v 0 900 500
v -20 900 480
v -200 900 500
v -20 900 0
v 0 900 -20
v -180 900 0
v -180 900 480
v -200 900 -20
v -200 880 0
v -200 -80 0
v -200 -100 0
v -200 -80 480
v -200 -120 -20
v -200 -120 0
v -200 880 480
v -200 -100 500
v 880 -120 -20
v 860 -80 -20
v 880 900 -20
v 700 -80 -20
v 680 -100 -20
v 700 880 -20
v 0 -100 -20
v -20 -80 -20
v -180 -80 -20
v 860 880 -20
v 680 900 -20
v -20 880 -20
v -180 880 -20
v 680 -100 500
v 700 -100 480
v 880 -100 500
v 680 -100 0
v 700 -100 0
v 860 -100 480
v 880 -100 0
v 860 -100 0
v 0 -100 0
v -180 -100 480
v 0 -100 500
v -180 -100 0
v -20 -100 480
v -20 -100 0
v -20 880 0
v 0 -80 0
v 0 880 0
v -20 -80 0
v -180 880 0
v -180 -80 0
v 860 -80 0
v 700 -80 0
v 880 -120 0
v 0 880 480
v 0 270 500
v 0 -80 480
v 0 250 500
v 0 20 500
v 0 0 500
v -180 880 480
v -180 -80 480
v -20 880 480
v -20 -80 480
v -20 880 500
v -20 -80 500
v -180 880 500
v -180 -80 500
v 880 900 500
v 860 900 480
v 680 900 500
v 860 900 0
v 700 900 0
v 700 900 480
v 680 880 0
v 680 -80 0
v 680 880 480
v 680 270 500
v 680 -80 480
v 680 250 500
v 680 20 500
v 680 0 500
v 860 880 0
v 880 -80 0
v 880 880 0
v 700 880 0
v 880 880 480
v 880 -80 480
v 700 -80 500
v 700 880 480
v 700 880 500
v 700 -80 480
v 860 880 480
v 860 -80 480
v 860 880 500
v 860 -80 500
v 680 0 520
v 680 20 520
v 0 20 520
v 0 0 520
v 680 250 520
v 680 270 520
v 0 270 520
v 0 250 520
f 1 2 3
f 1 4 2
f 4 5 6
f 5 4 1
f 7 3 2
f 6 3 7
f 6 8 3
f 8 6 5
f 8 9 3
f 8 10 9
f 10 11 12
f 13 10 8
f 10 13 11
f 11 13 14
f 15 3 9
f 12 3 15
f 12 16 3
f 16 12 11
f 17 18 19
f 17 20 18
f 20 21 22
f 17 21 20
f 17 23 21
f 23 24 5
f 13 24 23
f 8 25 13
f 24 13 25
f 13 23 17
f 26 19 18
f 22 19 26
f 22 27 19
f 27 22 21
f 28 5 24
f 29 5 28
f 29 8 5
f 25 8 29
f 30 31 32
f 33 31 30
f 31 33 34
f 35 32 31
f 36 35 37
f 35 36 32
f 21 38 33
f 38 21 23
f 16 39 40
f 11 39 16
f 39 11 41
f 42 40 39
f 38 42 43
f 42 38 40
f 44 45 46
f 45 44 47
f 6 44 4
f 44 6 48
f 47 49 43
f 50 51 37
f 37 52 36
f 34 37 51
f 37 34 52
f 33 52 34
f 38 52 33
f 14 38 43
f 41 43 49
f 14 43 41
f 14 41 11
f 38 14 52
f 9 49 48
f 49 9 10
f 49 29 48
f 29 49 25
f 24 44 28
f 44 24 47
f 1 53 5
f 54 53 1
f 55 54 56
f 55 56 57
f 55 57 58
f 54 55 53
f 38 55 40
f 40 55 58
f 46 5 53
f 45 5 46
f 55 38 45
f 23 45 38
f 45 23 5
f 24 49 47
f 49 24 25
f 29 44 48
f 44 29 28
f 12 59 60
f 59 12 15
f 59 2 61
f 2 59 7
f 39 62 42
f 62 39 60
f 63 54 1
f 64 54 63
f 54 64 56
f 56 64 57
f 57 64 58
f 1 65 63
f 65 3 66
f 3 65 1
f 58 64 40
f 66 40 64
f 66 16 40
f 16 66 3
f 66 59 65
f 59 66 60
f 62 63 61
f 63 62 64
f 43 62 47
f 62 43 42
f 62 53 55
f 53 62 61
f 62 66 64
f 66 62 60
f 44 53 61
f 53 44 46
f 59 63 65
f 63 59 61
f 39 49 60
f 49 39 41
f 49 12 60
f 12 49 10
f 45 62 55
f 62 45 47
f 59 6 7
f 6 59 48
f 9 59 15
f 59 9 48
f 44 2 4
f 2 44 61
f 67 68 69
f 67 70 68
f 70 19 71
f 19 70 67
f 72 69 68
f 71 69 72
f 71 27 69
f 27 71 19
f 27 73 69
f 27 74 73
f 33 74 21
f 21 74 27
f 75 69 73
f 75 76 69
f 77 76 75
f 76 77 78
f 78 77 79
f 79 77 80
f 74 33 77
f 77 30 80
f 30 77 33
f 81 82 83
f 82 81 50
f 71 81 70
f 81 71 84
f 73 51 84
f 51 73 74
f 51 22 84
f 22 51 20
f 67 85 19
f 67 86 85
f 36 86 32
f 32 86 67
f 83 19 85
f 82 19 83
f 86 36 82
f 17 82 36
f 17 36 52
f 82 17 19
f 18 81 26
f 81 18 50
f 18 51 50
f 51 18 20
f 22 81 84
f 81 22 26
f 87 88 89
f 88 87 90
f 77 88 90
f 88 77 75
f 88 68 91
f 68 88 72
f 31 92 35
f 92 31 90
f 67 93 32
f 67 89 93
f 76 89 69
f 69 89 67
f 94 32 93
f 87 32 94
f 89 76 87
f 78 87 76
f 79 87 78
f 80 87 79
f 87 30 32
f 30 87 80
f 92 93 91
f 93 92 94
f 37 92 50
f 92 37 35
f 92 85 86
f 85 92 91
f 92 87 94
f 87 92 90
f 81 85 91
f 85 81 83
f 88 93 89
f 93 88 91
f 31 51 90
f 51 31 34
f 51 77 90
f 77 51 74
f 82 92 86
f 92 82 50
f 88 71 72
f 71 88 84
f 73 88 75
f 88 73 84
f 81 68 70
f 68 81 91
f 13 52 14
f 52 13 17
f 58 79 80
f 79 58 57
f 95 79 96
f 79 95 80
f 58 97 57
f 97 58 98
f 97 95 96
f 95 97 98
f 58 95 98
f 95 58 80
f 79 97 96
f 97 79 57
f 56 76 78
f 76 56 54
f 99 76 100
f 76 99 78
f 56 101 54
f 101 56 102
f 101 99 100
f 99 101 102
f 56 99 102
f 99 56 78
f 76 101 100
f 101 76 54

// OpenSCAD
// -*- mode: c -*-
/* All distances are in mm. */

// Set output quality
$fn=50;

// -- - -- - -- - -- - -- - -- - -- - -- - -- - -- - -- - -- - -- - -- - -- - -- - -- - -- - -- - 
//                                      START SPEC
// -- - -- - -- - -- - -- - -- - -- - -- - -- - -- - -- - -- - -- - -- - -- - -- - -- - -- - -- - 

module render_frame(x, y, length, position, orientation){
    translate(position) {
        rotate(orientation){
            cube([x, y, length]);
        }
    }
}

module render_2020(length, position, orientation){
    render_frame(20, 20, length, position, orientation);
}

module render_4040(length, position, orientation){
    render_frame(40, 40, length, position, orientation);
}

module render_4080(length, position, orientation){
    render_frame(40, 80, length, position, orientation);
}


// -- - -- - -- - -- - -- - -- - -- - -- - -- - -- - -- - -- - -- - -- - -- - -- - -- - -- - -- - 
//                                       END PART SPEC
// -- - -- - -- - -- - -- - -- - -- - -- - -- - -- - -- - -- - -- - -- - -- - -- - -- - -- - -- - 

side_panel_width=200;
side_panel_length=1000;
side_panel_height=500;

// 6m PER BOX (4x each dimension)
module render_side_panel(position){
    translate(position){
        render_2020(side_panel_length, [0,0,0], [-90,0,0]);
        render_2020(side_panel_length, [(side_panel_width - 20),0,0], [-90,0,0]);
        render_2020(side_panel_width, [0,20,0], [-90,0,-90]);
        render_2020(side_panel_width, [0,side_panel_length,0], [-90,0,-90]);
        
        render_2020(side_panel_length, [0,0,side_panel_height], [-90,0,0]);
        render_2020(side_panel_length, [(side_panel_width - 20),0,side_panel_height], [-90,0,0]);
        render_2020(side_panel_width, [0,20,side_panel_height], [-90,0,-90]);
        render_2020(side_panel_width, [0,side_panel_length,side_panel_height], [-90,0,-90]);
        
        render_2020(side_panel_height, [0,0,0],[0,0,0]);
        render_2020(side_panel_height, [(side_panel_width - 20),0,0],[0,0,0]);
        render_2020(side_panel_height, [0,side_panel_length-20,0],[0,0,0]);
        render_2020(side_panel_height, [(side_panel_width - 20),side_panel_length-20,0],[0,0,0]);
        
        
        
    }
}

// Define primary dimensions
frame_width=600;
frame_length=1300;
frame_seat_length=500;
monitor_height=800;


// Bottom rectangnle frame
// 4080: 2x Length, 3x width
if(0){
render_4080(frame_length, [0,0,80], [-90,0,0]);
render_4080(frame_length, [(40+frame_width),0,80], [-90,0,0]);
render_4080(frame_width, [40,40,80], [-90,0,-90]);
render_4080(frame_width, [40,frame_length,80], [-90,0,-90]);

// Seat frame
// 4080:
// 4040:
seat_offset=80;
seat_width=500;
render_4080(frame_width, [40,frame_seat_length,80], [-90,0,-90]);
render_4040(frame_seat_length, [seat_offset,0,120], [-90,0,0]);
render_4040(frame_seat_length, [seat_offset+seat_width,0,120], [-90,0,0]);

// Monitor stands
// 4080:
monitor_offset=160;
render_4080(monitor_height, [0,frame_length-monitor_offset,80], [0,0,0]);
render_4080(monitor_height, [(40+frame_width),frame_length-monitor_offset,80], [0,0,0]);
render_4080(frame_width, [40,40+frame_length-monitor_offset,monitor_height+80], [-90,0,-90]);
}

// Side panels
// 2020: 
render_side_panel([-side_panel_width, -100, 0]);
render_side_panel([frame_width+80, -100, 0]);
// Connector
render_2020((side_panel_width*2)+frame_width+80, [-side_panel_width, -120,0], [0,90,0]);

// Keyboard tray, initial design
kbm_tray_length=250;
render_2020(frame_width+80, [0,0,side_panel_height+20], [0,90,0]);
render_2020(frame_width+80, [0,kbm_tray_length,side_panel_height+20], [0,90,0]);
